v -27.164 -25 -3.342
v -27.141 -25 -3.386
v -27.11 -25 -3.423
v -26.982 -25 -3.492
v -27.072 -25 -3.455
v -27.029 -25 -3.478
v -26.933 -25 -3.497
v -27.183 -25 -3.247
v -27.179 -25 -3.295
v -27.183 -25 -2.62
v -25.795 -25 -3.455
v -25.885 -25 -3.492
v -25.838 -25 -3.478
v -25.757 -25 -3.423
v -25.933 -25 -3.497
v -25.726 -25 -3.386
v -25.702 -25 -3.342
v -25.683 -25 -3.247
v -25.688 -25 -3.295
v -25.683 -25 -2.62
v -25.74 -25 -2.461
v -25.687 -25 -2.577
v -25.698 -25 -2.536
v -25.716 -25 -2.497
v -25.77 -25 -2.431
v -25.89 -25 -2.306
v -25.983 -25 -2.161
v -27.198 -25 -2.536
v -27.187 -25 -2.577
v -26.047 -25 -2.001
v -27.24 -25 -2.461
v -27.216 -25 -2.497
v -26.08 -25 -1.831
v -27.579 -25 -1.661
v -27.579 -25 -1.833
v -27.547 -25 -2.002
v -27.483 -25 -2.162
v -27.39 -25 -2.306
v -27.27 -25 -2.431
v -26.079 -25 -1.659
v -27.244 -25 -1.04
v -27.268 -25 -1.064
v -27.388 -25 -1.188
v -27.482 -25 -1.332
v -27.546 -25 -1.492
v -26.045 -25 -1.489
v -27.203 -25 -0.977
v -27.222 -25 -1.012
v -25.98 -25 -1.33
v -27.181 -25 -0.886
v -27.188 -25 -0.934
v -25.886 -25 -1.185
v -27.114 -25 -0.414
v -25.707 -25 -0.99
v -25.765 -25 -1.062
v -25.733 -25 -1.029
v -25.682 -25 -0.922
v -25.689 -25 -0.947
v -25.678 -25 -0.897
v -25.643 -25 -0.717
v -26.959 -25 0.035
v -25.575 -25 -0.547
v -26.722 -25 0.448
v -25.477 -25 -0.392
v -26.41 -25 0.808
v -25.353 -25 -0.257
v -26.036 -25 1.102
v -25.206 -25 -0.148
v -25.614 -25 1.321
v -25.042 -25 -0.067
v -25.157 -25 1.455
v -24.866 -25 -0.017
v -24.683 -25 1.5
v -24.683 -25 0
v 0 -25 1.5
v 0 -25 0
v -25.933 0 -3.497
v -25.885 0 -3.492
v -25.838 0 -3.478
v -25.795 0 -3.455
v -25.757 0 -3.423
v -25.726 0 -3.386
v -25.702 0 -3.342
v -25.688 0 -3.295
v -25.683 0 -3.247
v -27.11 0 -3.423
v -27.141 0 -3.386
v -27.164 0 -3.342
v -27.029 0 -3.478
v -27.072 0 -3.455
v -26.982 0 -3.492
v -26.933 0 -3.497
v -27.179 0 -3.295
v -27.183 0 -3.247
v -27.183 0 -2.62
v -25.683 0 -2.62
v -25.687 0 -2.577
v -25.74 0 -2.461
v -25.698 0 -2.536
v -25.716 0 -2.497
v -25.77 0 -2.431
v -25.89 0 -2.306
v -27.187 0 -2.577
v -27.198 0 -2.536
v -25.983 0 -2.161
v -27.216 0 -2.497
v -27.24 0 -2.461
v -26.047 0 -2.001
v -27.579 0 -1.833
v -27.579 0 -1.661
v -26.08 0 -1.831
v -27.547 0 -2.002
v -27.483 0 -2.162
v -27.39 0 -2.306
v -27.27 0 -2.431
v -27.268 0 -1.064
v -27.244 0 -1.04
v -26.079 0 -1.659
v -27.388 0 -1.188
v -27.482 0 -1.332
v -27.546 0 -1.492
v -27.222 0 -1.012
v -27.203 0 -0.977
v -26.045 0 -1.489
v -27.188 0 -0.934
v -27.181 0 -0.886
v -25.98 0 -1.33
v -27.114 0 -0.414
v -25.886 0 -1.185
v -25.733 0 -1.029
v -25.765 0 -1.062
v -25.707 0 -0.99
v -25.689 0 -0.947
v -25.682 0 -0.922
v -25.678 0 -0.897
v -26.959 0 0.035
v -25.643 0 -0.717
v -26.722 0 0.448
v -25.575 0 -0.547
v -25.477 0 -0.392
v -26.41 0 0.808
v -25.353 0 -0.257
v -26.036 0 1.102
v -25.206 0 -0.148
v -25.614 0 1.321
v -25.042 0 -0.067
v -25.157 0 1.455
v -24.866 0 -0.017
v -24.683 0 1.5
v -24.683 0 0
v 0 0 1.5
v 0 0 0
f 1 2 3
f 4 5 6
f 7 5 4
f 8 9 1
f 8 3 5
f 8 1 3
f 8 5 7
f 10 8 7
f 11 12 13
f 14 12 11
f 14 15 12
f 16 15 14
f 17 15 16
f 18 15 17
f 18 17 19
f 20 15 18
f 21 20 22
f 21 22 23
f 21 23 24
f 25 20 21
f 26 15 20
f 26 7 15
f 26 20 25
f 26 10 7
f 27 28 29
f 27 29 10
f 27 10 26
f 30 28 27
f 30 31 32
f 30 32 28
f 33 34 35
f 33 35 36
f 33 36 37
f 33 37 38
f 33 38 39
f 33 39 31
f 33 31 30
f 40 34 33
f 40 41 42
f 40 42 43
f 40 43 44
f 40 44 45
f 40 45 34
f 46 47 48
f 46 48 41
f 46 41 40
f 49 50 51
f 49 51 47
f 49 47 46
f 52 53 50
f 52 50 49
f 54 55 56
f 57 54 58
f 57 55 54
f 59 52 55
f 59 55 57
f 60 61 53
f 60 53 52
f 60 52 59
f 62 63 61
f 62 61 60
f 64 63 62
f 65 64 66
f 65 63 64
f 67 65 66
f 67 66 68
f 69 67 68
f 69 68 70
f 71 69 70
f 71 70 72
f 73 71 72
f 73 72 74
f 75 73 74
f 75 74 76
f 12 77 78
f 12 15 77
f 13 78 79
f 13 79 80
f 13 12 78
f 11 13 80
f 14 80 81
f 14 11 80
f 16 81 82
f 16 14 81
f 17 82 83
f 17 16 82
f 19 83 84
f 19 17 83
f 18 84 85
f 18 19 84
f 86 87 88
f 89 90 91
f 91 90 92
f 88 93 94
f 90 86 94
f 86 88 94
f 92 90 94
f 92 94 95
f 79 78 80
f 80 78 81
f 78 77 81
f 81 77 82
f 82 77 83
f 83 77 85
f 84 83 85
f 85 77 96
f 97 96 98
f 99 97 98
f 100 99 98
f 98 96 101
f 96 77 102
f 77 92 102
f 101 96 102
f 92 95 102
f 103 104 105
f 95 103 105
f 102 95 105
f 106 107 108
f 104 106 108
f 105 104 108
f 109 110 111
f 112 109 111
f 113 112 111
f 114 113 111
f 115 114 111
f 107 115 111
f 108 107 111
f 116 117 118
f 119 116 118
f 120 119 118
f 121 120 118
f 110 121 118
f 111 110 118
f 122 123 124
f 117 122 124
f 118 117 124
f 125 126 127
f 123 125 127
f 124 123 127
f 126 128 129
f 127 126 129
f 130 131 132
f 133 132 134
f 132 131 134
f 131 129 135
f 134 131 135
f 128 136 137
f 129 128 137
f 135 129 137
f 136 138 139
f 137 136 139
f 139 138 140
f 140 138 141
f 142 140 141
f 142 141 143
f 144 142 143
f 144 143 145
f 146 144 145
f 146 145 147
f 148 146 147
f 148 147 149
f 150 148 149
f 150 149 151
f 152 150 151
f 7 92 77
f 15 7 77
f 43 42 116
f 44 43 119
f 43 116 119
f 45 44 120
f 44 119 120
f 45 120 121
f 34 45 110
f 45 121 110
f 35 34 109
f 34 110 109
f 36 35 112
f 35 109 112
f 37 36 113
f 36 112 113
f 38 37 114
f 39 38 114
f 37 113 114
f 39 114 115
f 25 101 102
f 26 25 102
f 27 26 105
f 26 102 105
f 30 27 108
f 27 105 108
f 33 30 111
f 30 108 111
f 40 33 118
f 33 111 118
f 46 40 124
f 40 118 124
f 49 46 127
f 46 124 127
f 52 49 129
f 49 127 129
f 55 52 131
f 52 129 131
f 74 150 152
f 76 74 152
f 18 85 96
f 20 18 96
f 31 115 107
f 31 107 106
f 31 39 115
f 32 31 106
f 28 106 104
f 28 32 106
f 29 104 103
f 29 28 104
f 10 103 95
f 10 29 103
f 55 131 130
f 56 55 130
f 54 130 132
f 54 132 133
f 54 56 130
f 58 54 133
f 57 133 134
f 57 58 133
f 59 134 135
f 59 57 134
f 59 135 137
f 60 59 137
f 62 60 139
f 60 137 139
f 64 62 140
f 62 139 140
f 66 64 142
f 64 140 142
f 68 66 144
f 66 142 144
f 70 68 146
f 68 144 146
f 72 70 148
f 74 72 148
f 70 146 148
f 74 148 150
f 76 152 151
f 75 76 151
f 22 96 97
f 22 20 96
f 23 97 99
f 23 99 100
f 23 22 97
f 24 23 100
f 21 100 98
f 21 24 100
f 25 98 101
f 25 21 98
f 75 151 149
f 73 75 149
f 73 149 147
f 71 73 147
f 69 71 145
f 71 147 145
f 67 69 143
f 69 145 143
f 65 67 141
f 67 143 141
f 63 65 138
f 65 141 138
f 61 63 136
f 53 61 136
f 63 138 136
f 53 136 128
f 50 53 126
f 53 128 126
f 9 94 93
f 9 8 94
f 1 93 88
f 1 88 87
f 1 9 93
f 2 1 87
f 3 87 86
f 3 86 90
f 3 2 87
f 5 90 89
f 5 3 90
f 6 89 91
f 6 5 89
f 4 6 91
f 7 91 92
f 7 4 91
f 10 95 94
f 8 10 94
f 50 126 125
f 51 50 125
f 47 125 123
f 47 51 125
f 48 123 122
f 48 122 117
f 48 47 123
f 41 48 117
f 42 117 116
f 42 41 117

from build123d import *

# Parameters (mm, degrees)
F1_DEPTH = 25
F2_R     = 0.25


with BuildPart() as f1:
    # F0 (on Front) → F1 (new body)
    with BuildSketch(Plane.XZ):
        with BuildLine():
            Line((-24.683436538, 0), (0, 0))
            Line((0, 0), (0, 1.5))
            Line((0, 1.5), (-24.683436538, 1.5))
            ThreePointArc((-24.683436538, 1.5), (-26.451203491, 0.767766953), (-27.183436538, -1))
            ThreePointArc((-27.183436538, -1), (-27.583436538, -1.7483314774), (-27.183436538, -2.4966629547))
            Line((-27.183436538, -2.4966629547), (-27.183436538, -3.4966629547))
            Line((-27.183436538, -3.4966629547), (-25.683436538, -3.4966629547))
            Line((-25.683436538, -3.4966629547), (-25.683436538, -2.4966629547))
            ThreePointArc((-25.683436538, -2.4966629547), (-26.083436538, -1.7483314774), (-25.683436538, -1))
            ThreePointArc((-25.683436538, -1), (-25.3905433192, -0.2928932188), (-24.683436538, 0))
        make_face()
    extrude(amount=F1_DEPTH)

    # F2
    f2_edges = [f1.edges().sort_by_distance(p)[0] for p in [
        (-27.183437, -12.5, -3.496663),
        (-25.683437, -12.5, -3.496663),
        (-25.683437, -12.5, -2.496663),
        (-25.683437, -12.5, -1),
        (-27.183437, -12.5, -2.496663),
        (-27.183437, -12.5, -1),
    ]]
    fillet(f2_edges, radius=F2_R)


solid = f1.part
